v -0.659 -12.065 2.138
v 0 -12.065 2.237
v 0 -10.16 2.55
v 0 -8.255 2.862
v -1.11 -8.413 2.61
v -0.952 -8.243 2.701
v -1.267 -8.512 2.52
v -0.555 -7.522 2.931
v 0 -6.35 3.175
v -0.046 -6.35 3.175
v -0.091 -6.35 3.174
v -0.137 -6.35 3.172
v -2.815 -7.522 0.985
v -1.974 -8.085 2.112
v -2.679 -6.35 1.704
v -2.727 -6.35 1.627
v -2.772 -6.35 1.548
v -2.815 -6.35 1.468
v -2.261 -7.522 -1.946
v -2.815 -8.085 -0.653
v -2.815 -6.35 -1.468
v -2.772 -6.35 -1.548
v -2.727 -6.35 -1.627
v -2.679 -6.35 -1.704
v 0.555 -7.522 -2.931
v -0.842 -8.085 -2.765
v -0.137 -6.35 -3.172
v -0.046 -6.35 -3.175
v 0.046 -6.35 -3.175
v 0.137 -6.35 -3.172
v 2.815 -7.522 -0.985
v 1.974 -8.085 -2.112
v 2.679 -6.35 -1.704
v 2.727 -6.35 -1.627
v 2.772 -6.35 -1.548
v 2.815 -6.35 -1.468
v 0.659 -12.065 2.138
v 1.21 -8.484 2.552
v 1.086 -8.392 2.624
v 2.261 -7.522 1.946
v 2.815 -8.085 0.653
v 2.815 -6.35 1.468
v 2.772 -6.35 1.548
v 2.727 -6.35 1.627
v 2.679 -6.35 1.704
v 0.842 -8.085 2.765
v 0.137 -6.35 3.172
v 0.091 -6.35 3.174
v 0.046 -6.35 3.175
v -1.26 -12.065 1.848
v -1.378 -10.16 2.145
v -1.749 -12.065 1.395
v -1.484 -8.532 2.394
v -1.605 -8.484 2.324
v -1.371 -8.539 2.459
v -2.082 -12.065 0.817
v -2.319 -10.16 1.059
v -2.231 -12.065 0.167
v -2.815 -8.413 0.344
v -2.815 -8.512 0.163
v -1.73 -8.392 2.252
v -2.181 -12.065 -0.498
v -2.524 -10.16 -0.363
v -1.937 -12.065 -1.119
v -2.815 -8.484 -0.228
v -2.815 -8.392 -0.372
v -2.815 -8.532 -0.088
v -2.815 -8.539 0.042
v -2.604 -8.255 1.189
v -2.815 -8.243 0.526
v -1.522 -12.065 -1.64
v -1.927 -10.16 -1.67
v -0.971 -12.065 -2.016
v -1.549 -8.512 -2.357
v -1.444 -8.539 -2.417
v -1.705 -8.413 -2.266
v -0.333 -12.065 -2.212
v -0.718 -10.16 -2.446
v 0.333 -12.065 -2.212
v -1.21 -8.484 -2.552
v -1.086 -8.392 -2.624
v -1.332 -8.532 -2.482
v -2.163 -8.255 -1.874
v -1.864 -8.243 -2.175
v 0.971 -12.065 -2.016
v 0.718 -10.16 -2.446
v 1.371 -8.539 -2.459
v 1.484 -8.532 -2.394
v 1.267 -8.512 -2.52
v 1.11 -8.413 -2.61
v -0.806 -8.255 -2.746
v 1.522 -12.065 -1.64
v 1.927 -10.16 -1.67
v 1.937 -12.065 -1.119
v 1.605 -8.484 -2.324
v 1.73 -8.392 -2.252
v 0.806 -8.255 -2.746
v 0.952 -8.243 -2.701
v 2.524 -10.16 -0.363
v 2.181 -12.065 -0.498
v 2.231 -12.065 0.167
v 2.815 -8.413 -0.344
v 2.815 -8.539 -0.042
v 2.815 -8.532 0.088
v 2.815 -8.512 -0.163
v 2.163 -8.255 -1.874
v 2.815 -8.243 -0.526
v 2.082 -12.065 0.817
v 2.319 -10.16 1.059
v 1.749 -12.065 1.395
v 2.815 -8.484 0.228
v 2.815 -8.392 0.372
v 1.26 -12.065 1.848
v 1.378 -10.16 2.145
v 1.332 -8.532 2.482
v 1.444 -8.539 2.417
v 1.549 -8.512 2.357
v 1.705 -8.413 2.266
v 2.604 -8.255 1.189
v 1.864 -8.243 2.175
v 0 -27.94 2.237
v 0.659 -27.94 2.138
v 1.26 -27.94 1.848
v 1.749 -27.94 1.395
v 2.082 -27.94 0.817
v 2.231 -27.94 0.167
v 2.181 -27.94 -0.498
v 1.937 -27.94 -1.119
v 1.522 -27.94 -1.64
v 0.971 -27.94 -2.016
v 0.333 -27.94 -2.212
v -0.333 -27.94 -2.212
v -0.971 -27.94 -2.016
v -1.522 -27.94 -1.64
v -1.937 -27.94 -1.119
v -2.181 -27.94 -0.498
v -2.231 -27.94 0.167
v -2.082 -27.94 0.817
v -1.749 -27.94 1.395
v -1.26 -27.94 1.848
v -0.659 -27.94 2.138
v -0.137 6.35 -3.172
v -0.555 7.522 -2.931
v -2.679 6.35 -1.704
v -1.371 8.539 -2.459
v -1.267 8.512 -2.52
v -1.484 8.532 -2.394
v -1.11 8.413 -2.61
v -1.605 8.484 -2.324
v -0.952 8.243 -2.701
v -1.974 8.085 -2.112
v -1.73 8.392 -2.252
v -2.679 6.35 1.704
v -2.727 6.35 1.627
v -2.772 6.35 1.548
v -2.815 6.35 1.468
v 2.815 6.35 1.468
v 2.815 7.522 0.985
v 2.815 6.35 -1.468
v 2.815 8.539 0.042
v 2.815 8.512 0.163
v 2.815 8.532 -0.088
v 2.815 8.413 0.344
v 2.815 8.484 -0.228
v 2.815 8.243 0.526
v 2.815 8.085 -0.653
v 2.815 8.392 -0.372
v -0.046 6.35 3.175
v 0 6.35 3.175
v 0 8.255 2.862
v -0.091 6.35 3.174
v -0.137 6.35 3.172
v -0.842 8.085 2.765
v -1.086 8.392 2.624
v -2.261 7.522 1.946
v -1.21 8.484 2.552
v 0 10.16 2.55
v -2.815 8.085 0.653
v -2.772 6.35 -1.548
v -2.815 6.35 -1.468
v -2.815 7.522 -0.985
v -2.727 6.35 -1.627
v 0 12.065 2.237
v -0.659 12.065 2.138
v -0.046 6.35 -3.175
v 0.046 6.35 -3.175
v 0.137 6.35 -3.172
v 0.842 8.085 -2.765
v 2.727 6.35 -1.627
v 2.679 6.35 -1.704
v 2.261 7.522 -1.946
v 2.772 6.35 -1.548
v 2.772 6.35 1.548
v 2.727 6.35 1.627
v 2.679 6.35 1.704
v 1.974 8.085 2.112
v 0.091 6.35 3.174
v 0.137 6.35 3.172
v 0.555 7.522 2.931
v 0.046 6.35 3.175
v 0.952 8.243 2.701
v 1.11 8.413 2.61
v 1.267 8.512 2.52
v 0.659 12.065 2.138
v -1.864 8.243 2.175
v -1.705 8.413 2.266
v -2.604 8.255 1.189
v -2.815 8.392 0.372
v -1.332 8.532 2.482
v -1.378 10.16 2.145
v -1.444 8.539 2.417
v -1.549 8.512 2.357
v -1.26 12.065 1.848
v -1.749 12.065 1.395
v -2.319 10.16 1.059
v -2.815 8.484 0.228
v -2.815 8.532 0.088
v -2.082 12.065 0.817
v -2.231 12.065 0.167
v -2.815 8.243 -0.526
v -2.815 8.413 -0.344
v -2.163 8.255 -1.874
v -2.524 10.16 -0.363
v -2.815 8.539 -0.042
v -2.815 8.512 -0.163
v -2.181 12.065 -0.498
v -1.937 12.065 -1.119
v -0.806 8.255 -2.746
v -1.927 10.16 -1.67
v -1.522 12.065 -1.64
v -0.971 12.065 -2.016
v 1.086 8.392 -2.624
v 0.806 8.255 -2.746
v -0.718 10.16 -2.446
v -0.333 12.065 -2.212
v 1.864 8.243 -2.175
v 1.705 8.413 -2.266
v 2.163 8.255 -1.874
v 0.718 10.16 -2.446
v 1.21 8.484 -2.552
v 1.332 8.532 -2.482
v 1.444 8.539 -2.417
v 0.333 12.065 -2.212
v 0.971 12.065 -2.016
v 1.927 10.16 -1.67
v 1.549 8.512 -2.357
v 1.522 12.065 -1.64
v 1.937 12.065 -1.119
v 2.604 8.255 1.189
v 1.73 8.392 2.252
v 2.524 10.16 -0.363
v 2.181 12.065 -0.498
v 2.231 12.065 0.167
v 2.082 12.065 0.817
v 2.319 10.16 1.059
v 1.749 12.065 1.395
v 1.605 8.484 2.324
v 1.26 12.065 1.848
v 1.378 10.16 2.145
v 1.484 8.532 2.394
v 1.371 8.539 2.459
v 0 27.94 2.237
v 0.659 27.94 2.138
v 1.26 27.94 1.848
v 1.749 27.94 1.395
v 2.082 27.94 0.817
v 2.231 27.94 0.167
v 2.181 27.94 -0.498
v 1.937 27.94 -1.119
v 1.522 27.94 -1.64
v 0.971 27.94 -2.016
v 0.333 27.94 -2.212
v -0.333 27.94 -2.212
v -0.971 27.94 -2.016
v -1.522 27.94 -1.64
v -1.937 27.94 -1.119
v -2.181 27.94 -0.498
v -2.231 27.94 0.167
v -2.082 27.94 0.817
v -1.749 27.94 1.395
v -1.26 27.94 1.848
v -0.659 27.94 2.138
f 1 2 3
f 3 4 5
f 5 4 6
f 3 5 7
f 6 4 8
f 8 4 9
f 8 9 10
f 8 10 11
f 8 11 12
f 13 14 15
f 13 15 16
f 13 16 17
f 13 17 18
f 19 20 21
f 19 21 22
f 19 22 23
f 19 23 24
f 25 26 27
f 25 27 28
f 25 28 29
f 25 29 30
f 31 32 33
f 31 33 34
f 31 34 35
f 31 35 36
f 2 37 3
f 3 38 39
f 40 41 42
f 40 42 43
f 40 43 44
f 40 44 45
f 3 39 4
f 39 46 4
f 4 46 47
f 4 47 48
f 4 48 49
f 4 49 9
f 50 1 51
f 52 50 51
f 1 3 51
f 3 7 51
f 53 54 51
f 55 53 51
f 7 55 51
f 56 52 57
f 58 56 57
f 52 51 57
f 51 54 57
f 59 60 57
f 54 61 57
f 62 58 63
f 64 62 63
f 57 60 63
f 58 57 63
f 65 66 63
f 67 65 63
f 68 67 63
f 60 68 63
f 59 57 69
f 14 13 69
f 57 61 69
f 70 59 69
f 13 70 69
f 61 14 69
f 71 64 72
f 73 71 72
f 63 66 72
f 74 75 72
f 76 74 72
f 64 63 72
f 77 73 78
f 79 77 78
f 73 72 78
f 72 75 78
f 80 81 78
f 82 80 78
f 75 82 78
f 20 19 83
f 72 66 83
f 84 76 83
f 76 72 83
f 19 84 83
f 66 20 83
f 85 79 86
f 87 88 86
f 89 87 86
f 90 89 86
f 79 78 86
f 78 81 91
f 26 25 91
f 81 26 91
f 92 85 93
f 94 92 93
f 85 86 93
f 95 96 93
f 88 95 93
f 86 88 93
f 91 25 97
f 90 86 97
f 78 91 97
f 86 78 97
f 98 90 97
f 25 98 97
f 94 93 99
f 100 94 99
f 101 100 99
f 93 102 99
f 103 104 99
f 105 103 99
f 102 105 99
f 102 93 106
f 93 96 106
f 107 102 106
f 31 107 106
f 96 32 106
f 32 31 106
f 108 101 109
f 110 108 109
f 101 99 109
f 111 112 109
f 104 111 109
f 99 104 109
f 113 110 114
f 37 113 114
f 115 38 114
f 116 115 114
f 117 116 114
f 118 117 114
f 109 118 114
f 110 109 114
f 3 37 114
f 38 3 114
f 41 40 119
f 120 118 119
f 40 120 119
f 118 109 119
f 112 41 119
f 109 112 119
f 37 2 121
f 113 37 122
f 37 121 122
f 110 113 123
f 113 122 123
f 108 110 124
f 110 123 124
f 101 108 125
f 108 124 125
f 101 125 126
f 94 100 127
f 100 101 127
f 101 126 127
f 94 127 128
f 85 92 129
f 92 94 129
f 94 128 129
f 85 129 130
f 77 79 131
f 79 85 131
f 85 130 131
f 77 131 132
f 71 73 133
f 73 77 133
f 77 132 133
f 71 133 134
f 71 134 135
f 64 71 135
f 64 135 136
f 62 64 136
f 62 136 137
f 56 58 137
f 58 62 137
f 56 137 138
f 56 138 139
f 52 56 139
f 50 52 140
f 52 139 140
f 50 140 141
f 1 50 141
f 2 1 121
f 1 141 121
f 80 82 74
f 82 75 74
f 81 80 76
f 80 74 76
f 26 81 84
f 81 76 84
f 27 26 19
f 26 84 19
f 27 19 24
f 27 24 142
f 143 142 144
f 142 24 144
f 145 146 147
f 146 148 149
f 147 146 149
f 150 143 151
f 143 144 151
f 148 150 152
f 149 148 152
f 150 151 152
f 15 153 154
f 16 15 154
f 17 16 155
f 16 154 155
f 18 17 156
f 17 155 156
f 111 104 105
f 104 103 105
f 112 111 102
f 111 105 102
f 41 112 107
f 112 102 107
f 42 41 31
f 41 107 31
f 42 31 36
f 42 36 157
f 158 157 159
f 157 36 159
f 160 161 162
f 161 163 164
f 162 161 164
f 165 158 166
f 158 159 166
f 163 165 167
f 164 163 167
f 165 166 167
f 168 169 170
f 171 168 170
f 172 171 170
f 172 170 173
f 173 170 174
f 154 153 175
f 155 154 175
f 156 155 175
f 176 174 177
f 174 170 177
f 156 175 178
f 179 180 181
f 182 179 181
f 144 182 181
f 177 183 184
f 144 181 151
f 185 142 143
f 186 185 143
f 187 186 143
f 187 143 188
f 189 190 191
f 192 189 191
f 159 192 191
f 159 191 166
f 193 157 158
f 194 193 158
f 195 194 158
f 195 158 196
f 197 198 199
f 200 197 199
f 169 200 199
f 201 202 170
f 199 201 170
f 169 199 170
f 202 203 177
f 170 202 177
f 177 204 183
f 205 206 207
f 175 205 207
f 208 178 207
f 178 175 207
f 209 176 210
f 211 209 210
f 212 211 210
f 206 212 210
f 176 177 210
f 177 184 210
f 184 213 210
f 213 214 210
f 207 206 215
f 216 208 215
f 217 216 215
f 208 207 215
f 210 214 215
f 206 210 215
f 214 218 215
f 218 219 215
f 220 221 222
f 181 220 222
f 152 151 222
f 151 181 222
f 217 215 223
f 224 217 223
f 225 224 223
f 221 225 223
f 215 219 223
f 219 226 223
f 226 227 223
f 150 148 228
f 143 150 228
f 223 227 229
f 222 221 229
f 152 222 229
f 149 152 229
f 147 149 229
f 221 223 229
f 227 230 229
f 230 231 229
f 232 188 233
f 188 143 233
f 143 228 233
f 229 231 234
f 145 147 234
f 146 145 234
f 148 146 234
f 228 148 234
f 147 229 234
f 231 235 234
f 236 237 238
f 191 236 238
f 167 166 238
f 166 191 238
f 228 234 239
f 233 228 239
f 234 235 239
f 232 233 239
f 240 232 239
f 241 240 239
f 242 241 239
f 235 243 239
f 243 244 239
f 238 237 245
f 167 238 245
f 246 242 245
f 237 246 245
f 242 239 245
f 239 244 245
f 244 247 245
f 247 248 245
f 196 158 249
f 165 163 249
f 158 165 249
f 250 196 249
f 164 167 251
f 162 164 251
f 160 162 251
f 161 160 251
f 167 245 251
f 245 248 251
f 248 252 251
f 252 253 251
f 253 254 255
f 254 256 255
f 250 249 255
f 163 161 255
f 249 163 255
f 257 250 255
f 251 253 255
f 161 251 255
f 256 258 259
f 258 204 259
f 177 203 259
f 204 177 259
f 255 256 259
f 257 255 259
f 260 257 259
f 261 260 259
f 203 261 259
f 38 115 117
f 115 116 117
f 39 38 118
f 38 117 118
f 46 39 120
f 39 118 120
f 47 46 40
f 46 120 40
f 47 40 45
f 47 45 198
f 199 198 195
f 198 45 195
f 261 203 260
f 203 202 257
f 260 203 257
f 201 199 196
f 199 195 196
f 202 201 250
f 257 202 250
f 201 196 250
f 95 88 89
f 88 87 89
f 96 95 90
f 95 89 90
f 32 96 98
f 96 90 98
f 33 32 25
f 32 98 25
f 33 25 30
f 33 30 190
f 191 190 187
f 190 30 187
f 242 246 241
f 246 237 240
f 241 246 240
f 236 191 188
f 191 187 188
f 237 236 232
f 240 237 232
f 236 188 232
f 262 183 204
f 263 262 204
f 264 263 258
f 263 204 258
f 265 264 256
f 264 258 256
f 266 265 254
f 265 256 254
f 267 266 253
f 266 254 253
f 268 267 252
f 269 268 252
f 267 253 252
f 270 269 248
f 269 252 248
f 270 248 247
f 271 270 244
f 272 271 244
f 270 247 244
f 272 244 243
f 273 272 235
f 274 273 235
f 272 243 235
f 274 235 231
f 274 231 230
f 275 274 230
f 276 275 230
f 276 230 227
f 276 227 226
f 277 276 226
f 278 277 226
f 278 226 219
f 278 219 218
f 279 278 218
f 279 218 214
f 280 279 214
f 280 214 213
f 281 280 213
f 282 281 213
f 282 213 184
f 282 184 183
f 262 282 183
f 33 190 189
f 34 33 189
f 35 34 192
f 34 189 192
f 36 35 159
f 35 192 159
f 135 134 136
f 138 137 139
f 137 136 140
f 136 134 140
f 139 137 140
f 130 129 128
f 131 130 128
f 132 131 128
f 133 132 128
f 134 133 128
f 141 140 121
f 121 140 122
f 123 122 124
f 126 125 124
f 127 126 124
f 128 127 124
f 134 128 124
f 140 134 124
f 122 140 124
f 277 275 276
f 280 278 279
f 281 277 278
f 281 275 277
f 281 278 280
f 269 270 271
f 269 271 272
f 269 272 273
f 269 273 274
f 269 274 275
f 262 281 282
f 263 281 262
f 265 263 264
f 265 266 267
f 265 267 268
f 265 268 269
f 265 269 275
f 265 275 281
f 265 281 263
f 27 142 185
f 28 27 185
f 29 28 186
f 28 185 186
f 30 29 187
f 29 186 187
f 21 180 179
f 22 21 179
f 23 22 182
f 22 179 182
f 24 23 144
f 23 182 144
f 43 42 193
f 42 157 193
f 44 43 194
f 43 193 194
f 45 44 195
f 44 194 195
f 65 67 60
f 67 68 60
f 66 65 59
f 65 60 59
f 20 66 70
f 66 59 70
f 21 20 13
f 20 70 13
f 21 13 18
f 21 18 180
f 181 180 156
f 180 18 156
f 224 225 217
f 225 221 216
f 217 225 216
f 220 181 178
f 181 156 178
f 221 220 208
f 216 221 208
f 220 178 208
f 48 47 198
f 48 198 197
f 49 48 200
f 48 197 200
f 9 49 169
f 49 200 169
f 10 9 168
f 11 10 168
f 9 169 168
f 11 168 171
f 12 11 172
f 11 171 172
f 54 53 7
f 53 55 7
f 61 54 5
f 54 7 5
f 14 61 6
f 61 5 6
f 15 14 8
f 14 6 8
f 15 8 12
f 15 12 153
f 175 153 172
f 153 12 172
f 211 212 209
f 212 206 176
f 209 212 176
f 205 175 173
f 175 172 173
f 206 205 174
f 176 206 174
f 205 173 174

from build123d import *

# Parameters (mm, degrees)
SKETCH3_W                = 0.428843097
SKETCH3_H                = 18.90052945
CUT_EXTRUDE1_DEPTH       = 14.99883388
CIRPATTERN1_COUNT        = 6
BOSS_EXTRUDE1_DEPTH      = 27.94
BOSS_EXTRUDE1_DEPTH_BACK = 27.94
SKETCH5_R                = 2.237093308


with BuildPart() as part:
    # Sketch1 → Revolve1 (revolve)
    with BuildSketch(Plane.XY):
        Polygon((2.237093308, -12.065), (3.175, -6.35), (3.175, 6.35), (2.237093308, 12.065), align=None)
    revolve(axis=Axis((0, 6.041374164, 0), (0, -1, 0)))

    # Sketch3 → Cut-Extrude1 (cut, through all)
    with BuildSketch(Plane.XY.offset(3.175)):
        with Locations((-3.029889302, -0.659045193)):
            Rectangle(SKETCH3_W, SKETCH3_H)
    cut_extrude1 = extrude(amount=-CUT_EXTRUDE1_DEPTH, mode=Mode.SUBTRACT)

    # CirPattern1: Cut-Extrude1 ×6 about axis
    cirpattern1_axis = Axis((0, 6.041374164, 0), (0, 1, 0))
    for i in range(1, CIRPATTERN1_COUNT):
        add(cut_extrude1.rotate(cirpattern1_axis, i * 360 / CIRPATTERN1_COUNT), mode=Mode.SUBTRACT)

    # Sketch5 → Boss-Extrude1 (add, two sides: drawn at the far end of the back side and taken through both)
    with BuildSketch(Plane(origin=(0, 0, 0), x_dir=(1, 0, 0), z_dir=(0, 1, 0)).offset(-BOSS_EXTRUDE1_DEPTH_BACK)):
        Circle(SKETCH5_R)
    extrude(amount=BOSS_EXTRUDE1_DEPTH + BOSS_EXTRUDE1_DEPTH_BACK)


solid = part.part
